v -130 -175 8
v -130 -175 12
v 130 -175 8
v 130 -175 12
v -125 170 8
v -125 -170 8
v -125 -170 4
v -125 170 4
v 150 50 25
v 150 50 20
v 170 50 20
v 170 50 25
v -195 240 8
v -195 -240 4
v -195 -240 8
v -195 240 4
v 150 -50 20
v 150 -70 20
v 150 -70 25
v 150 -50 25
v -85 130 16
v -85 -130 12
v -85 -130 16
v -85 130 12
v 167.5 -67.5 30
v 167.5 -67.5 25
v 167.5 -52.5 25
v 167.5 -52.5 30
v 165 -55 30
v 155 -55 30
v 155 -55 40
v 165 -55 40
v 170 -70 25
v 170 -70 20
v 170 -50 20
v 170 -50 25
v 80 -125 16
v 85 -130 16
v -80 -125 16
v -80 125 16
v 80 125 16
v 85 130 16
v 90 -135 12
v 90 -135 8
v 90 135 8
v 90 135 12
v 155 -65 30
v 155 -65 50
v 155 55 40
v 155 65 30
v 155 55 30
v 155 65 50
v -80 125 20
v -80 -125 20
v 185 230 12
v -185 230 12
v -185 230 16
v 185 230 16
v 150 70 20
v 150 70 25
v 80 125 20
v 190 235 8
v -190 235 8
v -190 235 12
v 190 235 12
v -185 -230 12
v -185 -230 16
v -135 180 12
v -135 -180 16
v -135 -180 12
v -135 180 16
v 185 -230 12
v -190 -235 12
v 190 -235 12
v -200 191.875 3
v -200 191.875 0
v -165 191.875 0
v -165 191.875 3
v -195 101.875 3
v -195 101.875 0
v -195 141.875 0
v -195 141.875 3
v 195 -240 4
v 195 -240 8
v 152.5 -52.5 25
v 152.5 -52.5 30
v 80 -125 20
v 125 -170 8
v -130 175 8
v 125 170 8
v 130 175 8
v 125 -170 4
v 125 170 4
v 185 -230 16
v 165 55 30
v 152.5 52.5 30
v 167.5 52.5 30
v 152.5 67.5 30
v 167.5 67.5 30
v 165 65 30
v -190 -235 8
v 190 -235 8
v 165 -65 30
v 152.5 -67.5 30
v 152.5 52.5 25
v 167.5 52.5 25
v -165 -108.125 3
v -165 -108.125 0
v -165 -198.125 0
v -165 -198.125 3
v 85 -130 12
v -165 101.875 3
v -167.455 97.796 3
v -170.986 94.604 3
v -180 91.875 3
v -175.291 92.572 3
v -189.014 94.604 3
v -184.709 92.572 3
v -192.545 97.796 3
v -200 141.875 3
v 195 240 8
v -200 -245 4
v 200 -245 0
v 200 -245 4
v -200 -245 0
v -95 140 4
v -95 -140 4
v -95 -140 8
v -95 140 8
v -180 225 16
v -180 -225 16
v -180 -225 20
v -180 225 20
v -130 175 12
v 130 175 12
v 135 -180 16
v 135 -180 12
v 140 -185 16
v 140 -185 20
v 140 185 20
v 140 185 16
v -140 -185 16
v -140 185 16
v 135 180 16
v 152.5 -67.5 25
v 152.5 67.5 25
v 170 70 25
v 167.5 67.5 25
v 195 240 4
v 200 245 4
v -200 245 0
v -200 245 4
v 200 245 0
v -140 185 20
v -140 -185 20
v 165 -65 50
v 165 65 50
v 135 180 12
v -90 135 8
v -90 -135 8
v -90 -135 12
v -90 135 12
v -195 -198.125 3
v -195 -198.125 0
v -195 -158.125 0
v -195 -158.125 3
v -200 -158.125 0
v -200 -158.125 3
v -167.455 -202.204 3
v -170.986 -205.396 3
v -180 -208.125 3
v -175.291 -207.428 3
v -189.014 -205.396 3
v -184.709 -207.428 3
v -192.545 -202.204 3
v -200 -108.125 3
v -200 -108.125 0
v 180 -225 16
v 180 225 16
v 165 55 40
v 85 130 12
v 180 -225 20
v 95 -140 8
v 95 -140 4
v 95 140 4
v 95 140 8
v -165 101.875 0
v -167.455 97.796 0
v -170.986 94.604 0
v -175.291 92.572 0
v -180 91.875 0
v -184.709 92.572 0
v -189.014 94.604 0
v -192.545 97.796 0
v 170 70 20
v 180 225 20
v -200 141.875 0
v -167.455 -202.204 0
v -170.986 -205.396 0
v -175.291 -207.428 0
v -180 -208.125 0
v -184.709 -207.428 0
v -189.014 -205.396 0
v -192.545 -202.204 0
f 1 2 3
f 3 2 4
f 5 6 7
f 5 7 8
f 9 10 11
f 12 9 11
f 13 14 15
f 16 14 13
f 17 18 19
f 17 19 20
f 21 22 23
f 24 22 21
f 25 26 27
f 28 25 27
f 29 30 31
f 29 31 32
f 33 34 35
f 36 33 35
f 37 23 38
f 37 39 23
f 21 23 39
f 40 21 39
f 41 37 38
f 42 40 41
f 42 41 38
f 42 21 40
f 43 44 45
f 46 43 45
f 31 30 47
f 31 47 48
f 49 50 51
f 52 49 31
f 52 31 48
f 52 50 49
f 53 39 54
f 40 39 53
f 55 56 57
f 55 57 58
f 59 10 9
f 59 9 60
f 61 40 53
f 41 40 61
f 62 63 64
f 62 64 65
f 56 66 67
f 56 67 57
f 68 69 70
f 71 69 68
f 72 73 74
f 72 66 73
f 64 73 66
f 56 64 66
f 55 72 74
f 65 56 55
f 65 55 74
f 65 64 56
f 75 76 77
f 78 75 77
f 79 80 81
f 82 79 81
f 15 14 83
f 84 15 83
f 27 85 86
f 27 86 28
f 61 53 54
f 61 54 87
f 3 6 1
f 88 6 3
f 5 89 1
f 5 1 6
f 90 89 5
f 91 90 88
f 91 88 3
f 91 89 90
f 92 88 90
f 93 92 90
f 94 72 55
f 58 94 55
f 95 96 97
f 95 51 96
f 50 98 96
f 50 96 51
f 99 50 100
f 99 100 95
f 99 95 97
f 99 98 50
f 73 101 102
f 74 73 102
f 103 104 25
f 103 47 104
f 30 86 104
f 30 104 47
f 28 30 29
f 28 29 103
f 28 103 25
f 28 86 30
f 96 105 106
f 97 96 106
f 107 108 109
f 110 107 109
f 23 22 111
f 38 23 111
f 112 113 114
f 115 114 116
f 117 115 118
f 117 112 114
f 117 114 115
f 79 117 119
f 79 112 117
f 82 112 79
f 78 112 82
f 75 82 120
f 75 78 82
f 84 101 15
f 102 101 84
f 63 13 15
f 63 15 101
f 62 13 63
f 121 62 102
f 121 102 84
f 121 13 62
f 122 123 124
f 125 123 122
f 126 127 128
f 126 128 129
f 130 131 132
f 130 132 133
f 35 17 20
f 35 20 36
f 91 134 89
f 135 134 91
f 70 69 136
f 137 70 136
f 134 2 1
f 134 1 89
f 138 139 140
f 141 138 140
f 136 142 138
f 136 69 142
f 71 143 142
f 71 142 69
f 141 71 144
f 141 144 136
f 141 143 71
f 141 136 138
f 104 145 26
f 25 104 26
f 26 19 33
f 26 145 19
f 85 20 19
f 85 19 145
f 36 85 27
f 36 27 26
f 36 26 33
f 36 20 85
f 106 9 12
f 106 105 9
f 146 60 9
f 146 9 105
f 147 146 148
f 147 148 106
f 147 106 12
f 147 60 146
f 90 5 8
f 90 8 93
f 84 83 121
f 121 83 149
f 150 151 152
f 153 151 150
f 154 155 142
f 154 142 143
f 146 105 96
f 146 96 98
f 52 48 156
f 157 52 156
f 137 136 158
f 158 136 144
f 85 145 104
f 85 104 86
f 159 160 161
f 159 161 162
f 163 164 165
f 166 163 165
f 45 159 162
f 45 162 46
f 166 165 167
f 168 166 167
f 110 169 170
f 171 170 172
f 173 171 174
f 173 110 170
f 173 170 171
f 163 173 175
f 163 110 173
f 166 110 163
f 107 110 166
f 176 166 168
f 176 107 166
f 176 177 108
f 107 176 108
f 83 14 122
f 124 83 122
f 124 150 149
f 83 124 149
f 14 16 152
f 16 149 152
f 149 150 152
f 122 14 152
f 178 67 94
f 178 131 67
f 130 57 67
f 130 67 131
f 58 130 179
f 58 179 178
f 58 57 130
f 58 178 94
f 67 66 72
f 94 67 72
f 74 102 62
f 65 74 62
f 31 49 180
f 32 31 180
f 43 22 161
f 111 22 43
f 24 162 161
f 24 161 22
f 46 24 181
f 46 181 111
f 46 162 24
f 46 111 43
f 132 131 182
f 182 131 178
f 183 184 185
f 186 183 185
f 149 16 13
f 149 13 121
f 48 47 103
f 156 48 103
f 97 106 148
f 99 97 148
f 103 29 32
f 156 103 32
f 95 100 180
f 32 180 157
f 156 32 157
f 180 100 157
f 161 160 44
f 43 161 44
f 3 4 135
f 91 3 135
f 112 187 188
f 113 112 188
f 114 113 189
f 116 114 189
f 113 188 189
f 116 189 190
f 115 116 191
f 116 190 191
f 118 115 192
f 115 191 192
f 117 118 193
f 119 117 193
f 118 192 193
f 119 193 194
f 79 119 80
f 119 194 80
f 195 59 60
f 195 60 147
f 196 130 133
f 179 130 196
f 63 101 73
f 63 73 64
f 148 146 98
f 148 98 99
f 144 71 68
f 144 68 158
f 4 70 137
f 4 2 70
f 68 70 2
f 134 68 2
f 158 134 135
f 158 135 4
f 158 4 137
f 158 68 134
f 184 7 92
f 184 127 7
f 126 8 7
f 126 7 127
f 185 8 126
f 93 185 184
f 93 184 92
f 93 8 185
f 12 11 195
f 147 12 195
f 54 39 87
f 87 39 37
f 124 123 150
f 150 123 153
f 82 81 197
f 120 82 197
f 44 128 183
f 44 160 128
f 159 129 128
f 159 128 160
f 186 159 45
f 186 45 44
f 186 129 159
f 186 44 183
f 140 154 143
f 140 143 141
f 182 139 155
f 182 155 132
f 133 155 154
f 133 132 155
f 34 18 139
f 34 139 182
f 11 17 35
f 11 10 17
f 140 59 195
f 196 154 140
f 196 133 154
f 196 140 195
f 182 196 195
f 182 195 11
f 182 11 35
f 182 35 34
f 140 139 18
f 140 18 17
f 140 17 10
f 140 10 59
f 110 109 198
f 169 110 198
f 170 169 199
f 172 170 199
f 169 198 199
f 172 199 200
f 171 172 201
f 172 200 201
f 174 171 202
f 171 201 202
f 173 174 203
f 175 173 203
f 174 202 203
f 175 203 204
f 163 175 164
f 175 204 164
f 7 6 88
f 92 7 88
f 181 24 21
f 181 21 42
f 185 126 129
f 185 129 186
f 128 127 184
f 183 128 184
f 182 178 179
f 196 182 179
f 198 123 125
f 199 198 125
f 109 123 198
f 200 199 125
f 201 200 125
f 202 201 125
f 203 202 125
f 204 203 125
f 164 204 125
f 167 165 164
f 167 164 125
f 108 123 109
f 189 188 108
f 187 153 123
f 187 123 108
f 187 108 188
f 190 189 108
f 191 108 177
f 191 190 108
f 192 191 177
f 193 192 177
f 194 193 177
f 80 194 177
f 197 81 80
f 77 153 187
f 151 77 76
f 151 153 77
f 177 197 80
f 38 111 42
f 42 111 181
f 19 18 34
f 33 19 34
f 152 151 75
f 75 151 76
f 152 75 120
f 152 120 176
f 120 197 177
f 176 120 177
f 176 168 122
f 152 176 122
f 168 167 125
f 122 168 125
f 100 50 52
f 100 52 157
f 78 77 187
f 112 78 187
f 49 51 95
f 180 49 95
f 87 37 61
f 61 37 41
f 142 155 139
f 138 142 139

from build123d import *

# Parameters (mm, degrees)
BOSS_EXTRUDE2_DEPTH  = 4
SKETCH2_W            = 390
SKETCH2_H            = 480
BOSS_EXTRUDE3_DEPTH  = 4
SKETCH3_W            = 380
SKETCH3_H            = 470
BOSS_EXTRUDE4_DEPTH  = 4
SKETCH4_W            = 370
SKETCH4_H            = 460
BOSS_EXTRUDE5_DEPTH  = 4
SKETCH5_W            = 360
SKETCH5_H            = 450
BOSS_EXTRUDE6_DEPTH  = 4
SKETCH6_W            = 280
SKETCH6_H            = 370
CUT_EXTRUDE1_DEPTH   = 4
SKETCH7_W            = 270
SKETCH7_H            = 360
CUT_EXTRUDE2_DEPTH   = 4
SKETCH8_W            = 260
SKETCH8_H            = 350
CUT_EXTRUDE3_DEPTH   = 4
SKETCH9_W            = 250
SKETCH9_H            = 340
CUT_EXTRUDE4_DEPTH   = 4
SKETCH11_W           = 190
SKETCH11_H           = 280
BOSS_EXTRUDE7_DEPTH  = 4
SKETCH12_W           = 180
SKETCH12_H           = 270
BOSS_EXTRUDE8_DEPTH  = 4
SKETCH13_W           = 170
SKETCH13_H           = 260
BOSS_EXTRUDE9_DEPTH  = 4
SKETCH14_W           = 160
SKETCH14_H           = 250
BOSS_EXTRUDE10_DEPTH = 4
SKETCH15_W           = 20
SKETCH15_H           = 20
BOSS_EXTRUDE11_DEPTH = 5
SKETCH16_W           = 15
SKETCH16_H           = 15
BOSS_EXTRUDE12_DEPTH = 5
SKETCH17_W           = 10
SKETCH17_H           = 10
BOSS_EXTRUDE13_DEPTH = 20
BOSS_EXTRUDE14_REACH = 302
SKETCH18_W           = 10
SKETCH18_H           = 10
CUT_EXTRUDE6_DEPTH   = 3


with BuildPart() as part:
    # Sketch1 → Boss-Extrude2 (new body)
    with BuildSketch(Plane.XY):
        Polygon((200, 0), (200, -20), (200, -245), (-200, -245), (-200, -20), (-200, 0), (-200, 245), (200, 245), align=None)
    extrude(amount=BOSS_EXTRUDE2_DEPTH)

    # Sketch2 → Boss-Extrude3 (add)
    with BuildSketch(Plane.XY.offset(4)):
        Rectangle(SKETCH2_W, SKETCH2_H)
    extrude(amount=BOSS_EXTRUDE3_DEPTH)

    # Sketch3 → Boss-Extrude4 (add)
    with BuildSketch(Plane.XY.offset(8)):
        Rectangle(SKETCH3_W, SKETCH3_H)
    extrude(amount=BOSS_EXTRUDE4_DEPTH)

    # Sketch4 → Boss-Extrude5 (add)
    with BuildSketch(Plane.XY.offset(12)):
        Rectangle(SKETCH4_W, SKETCH4_H)
    extrude(amount=BOSS_EXTRUDE5_DEPTH)

    # Sketch5 → Boss-Extrude6 (add)
    with BuildSketch(Plane.XY.offset(16)):
        Rectangle(SKETCH5_W, SKETCH5_H)
    extrude(amount=BOSS_EXTRUDE6_DEPTH)

    # Sketch6 → Cut-Extrude1 (cut)
    with BuildSketch(Plane.XY.offset(20)):
        Rectangle(SKETCH6_W, SKETCH6_H)
    extrude(amount=-CUT_EXTRUDE1_DEPTH, mode=Mode.SUBTRACT)

    # Sketch7 → Cut-Extrude2 (cut)
    with BuildSketch(Plane.XY.offset(16)):
        Rectangle(SKETCH7_W, SKETCH7_H)
    extrude(amount=-CUT_EXTRUDE2_DEPTH, mode=Mode.SUBTRACT)

    # Sketch8 → Cut-Extrude3 (cut)
    with BuildSketch(Plane.XY.offset(12)):
        Rectangle(SKETCH8_W, SKETCH8_H)
    extrude(amount=-CUT_EXTRUDE3_DEPTH, mode=Mode.SUBTRACT)

    # Sketch9 → Cut-Extrude4 (cut)
    with BuildSketch(Plane.XY.offset(8)):
        Rectangle(SKETCH9_W, SKETCH9_H)
    extrude(amount=-CUT_EXTRUDE4_DEPTH, mode=Mode.SUBTRACT)

    # Sketch11 → Boss-Extrude7 (add)
    with BuildSketch(Plane.XY.offset(4)):
        Rectangle(SKETCH11_W, SKETCH11_H)
    extrude(amount=BOSS_EXTRUDE7_DEPTH)

    # Sketch12 → Boss-Extrude8 (add)
    with BuildSketch(Plane.XY.offset(8)):
        Rectangle(SKETCH12_W, SKETCH12_H)
    extrude(amount=BOSS_EXTRUDE8_DEPTH)

    # Sketch13 → Boss-Extrude9 (add)
    with BuildSketch(Plane.XY.offset(12)):
        Rectangle(SKETCH13_W, SKETCH13_H)
    extrude(amount=BOSS_EXTRUDE9_DEPTH)

    # Sketch14 → Boss-Extrude10 (add)
    with BuildSketch(Plane.XY.offset(16)):
        Rectangle(SKETCH14_W, SKETCH14_H)
    extrude(amount=BOSS_EXTRUDE10_DEPTH)

    # Sketch15 → Boss-Extrude11 (add)
    with BuildSketch(Plane.XY.offset(20)):
        with Locations((160, 60)):
            Rectangle(SKETCH15_W, SKETCH15_H)
        with Locations((160, -60)):
            Rectangle(SKETCH15_W, SKETCH15_H)
    extrude(amount=BOSS_EXTRUDE11_DEPTH)

    # Sketch16 → Boss-Extrude12 (add)
    with BuildSketch(Plane.XY.offset(25)):
        with Locations((160, 60)):
            Rectangle(SKETCH16_W, SKETCH16_H)
        with Locations((160, -60)):
            Rectangle(SKETCH16_W, SKETCH16_H)
    extrude(amount=BOSS_EXTRUDE12_DEPTH)

    # Sketch17 → Boss-Extrude13 (add)
    with BuildSketch(Plane.XY.offset(30)):
        with Locations((160, 60)):
            Rectangle(SKETCH17_W, SKETCH17_H)
        with Locations((160, -60)):
            Rectangle(SKETCH17_W, SKETCH17_H)
    extrude(amount=BOSS_EXTRUDE13_DEPTH)

    # Sketch18 → Boss-Extrude14 (add, up to next)
    with BuildSketch(Plane.XZ.offset(-55), mode=Mode.PRIVATE) as boss_extrude14_sk1:
        with Locations((160, 45)):
            Rectangle(SKETCH18_W, SKETCH18_H)
    boss_extrude14_tool1 = extrude(boss_extrude14_sk1.sketch, amount=BOSS_EXTRUDE14_REACH, mode=Mode.PRIVATE) - part.part
    add(boss_extrude14_tool1.solids().sort_by_distance((160, 55, 45))[0])

    # Sketch19 → Cut-Extrude6 (cut)
    with BuildSketch(Plane(origin=(0, 0, 0), x_dir=(-1, 0, 0), z_dir=(0, 0, -1))):
        with BuildLine():
            Line((165, 191.875), (165, 101.875))
            ThreePointArc((165, 101.875), (180, 91.875), (195, 101.875))
            Line((195, 101.875), (195, 141.875))
            Line((195, 141.875), (200, 141.875))
            Line((200, 141.875), (200, 191.875))
            Line((200, 191.875), (165, 191.875))
        make_face()
        with BuildLine():
            Line((165, -108.125), (165, -198.125))
            ThreePointArc((165, -198.125), (180, -208.125), (195, -198.125))
            Line((195, -198.125), (195, -158.125))
            Line((195, -158.125), (200, -158.125))
            Line((200, -158.125), (200, -108.125))
            Line((200, -108.125), (165, -108.125))
        make_face()
    extrude(amount=-CUT_EXTRUDE6_DEPTH, mode=Mode.SUBTRACT)


solid = part.part
